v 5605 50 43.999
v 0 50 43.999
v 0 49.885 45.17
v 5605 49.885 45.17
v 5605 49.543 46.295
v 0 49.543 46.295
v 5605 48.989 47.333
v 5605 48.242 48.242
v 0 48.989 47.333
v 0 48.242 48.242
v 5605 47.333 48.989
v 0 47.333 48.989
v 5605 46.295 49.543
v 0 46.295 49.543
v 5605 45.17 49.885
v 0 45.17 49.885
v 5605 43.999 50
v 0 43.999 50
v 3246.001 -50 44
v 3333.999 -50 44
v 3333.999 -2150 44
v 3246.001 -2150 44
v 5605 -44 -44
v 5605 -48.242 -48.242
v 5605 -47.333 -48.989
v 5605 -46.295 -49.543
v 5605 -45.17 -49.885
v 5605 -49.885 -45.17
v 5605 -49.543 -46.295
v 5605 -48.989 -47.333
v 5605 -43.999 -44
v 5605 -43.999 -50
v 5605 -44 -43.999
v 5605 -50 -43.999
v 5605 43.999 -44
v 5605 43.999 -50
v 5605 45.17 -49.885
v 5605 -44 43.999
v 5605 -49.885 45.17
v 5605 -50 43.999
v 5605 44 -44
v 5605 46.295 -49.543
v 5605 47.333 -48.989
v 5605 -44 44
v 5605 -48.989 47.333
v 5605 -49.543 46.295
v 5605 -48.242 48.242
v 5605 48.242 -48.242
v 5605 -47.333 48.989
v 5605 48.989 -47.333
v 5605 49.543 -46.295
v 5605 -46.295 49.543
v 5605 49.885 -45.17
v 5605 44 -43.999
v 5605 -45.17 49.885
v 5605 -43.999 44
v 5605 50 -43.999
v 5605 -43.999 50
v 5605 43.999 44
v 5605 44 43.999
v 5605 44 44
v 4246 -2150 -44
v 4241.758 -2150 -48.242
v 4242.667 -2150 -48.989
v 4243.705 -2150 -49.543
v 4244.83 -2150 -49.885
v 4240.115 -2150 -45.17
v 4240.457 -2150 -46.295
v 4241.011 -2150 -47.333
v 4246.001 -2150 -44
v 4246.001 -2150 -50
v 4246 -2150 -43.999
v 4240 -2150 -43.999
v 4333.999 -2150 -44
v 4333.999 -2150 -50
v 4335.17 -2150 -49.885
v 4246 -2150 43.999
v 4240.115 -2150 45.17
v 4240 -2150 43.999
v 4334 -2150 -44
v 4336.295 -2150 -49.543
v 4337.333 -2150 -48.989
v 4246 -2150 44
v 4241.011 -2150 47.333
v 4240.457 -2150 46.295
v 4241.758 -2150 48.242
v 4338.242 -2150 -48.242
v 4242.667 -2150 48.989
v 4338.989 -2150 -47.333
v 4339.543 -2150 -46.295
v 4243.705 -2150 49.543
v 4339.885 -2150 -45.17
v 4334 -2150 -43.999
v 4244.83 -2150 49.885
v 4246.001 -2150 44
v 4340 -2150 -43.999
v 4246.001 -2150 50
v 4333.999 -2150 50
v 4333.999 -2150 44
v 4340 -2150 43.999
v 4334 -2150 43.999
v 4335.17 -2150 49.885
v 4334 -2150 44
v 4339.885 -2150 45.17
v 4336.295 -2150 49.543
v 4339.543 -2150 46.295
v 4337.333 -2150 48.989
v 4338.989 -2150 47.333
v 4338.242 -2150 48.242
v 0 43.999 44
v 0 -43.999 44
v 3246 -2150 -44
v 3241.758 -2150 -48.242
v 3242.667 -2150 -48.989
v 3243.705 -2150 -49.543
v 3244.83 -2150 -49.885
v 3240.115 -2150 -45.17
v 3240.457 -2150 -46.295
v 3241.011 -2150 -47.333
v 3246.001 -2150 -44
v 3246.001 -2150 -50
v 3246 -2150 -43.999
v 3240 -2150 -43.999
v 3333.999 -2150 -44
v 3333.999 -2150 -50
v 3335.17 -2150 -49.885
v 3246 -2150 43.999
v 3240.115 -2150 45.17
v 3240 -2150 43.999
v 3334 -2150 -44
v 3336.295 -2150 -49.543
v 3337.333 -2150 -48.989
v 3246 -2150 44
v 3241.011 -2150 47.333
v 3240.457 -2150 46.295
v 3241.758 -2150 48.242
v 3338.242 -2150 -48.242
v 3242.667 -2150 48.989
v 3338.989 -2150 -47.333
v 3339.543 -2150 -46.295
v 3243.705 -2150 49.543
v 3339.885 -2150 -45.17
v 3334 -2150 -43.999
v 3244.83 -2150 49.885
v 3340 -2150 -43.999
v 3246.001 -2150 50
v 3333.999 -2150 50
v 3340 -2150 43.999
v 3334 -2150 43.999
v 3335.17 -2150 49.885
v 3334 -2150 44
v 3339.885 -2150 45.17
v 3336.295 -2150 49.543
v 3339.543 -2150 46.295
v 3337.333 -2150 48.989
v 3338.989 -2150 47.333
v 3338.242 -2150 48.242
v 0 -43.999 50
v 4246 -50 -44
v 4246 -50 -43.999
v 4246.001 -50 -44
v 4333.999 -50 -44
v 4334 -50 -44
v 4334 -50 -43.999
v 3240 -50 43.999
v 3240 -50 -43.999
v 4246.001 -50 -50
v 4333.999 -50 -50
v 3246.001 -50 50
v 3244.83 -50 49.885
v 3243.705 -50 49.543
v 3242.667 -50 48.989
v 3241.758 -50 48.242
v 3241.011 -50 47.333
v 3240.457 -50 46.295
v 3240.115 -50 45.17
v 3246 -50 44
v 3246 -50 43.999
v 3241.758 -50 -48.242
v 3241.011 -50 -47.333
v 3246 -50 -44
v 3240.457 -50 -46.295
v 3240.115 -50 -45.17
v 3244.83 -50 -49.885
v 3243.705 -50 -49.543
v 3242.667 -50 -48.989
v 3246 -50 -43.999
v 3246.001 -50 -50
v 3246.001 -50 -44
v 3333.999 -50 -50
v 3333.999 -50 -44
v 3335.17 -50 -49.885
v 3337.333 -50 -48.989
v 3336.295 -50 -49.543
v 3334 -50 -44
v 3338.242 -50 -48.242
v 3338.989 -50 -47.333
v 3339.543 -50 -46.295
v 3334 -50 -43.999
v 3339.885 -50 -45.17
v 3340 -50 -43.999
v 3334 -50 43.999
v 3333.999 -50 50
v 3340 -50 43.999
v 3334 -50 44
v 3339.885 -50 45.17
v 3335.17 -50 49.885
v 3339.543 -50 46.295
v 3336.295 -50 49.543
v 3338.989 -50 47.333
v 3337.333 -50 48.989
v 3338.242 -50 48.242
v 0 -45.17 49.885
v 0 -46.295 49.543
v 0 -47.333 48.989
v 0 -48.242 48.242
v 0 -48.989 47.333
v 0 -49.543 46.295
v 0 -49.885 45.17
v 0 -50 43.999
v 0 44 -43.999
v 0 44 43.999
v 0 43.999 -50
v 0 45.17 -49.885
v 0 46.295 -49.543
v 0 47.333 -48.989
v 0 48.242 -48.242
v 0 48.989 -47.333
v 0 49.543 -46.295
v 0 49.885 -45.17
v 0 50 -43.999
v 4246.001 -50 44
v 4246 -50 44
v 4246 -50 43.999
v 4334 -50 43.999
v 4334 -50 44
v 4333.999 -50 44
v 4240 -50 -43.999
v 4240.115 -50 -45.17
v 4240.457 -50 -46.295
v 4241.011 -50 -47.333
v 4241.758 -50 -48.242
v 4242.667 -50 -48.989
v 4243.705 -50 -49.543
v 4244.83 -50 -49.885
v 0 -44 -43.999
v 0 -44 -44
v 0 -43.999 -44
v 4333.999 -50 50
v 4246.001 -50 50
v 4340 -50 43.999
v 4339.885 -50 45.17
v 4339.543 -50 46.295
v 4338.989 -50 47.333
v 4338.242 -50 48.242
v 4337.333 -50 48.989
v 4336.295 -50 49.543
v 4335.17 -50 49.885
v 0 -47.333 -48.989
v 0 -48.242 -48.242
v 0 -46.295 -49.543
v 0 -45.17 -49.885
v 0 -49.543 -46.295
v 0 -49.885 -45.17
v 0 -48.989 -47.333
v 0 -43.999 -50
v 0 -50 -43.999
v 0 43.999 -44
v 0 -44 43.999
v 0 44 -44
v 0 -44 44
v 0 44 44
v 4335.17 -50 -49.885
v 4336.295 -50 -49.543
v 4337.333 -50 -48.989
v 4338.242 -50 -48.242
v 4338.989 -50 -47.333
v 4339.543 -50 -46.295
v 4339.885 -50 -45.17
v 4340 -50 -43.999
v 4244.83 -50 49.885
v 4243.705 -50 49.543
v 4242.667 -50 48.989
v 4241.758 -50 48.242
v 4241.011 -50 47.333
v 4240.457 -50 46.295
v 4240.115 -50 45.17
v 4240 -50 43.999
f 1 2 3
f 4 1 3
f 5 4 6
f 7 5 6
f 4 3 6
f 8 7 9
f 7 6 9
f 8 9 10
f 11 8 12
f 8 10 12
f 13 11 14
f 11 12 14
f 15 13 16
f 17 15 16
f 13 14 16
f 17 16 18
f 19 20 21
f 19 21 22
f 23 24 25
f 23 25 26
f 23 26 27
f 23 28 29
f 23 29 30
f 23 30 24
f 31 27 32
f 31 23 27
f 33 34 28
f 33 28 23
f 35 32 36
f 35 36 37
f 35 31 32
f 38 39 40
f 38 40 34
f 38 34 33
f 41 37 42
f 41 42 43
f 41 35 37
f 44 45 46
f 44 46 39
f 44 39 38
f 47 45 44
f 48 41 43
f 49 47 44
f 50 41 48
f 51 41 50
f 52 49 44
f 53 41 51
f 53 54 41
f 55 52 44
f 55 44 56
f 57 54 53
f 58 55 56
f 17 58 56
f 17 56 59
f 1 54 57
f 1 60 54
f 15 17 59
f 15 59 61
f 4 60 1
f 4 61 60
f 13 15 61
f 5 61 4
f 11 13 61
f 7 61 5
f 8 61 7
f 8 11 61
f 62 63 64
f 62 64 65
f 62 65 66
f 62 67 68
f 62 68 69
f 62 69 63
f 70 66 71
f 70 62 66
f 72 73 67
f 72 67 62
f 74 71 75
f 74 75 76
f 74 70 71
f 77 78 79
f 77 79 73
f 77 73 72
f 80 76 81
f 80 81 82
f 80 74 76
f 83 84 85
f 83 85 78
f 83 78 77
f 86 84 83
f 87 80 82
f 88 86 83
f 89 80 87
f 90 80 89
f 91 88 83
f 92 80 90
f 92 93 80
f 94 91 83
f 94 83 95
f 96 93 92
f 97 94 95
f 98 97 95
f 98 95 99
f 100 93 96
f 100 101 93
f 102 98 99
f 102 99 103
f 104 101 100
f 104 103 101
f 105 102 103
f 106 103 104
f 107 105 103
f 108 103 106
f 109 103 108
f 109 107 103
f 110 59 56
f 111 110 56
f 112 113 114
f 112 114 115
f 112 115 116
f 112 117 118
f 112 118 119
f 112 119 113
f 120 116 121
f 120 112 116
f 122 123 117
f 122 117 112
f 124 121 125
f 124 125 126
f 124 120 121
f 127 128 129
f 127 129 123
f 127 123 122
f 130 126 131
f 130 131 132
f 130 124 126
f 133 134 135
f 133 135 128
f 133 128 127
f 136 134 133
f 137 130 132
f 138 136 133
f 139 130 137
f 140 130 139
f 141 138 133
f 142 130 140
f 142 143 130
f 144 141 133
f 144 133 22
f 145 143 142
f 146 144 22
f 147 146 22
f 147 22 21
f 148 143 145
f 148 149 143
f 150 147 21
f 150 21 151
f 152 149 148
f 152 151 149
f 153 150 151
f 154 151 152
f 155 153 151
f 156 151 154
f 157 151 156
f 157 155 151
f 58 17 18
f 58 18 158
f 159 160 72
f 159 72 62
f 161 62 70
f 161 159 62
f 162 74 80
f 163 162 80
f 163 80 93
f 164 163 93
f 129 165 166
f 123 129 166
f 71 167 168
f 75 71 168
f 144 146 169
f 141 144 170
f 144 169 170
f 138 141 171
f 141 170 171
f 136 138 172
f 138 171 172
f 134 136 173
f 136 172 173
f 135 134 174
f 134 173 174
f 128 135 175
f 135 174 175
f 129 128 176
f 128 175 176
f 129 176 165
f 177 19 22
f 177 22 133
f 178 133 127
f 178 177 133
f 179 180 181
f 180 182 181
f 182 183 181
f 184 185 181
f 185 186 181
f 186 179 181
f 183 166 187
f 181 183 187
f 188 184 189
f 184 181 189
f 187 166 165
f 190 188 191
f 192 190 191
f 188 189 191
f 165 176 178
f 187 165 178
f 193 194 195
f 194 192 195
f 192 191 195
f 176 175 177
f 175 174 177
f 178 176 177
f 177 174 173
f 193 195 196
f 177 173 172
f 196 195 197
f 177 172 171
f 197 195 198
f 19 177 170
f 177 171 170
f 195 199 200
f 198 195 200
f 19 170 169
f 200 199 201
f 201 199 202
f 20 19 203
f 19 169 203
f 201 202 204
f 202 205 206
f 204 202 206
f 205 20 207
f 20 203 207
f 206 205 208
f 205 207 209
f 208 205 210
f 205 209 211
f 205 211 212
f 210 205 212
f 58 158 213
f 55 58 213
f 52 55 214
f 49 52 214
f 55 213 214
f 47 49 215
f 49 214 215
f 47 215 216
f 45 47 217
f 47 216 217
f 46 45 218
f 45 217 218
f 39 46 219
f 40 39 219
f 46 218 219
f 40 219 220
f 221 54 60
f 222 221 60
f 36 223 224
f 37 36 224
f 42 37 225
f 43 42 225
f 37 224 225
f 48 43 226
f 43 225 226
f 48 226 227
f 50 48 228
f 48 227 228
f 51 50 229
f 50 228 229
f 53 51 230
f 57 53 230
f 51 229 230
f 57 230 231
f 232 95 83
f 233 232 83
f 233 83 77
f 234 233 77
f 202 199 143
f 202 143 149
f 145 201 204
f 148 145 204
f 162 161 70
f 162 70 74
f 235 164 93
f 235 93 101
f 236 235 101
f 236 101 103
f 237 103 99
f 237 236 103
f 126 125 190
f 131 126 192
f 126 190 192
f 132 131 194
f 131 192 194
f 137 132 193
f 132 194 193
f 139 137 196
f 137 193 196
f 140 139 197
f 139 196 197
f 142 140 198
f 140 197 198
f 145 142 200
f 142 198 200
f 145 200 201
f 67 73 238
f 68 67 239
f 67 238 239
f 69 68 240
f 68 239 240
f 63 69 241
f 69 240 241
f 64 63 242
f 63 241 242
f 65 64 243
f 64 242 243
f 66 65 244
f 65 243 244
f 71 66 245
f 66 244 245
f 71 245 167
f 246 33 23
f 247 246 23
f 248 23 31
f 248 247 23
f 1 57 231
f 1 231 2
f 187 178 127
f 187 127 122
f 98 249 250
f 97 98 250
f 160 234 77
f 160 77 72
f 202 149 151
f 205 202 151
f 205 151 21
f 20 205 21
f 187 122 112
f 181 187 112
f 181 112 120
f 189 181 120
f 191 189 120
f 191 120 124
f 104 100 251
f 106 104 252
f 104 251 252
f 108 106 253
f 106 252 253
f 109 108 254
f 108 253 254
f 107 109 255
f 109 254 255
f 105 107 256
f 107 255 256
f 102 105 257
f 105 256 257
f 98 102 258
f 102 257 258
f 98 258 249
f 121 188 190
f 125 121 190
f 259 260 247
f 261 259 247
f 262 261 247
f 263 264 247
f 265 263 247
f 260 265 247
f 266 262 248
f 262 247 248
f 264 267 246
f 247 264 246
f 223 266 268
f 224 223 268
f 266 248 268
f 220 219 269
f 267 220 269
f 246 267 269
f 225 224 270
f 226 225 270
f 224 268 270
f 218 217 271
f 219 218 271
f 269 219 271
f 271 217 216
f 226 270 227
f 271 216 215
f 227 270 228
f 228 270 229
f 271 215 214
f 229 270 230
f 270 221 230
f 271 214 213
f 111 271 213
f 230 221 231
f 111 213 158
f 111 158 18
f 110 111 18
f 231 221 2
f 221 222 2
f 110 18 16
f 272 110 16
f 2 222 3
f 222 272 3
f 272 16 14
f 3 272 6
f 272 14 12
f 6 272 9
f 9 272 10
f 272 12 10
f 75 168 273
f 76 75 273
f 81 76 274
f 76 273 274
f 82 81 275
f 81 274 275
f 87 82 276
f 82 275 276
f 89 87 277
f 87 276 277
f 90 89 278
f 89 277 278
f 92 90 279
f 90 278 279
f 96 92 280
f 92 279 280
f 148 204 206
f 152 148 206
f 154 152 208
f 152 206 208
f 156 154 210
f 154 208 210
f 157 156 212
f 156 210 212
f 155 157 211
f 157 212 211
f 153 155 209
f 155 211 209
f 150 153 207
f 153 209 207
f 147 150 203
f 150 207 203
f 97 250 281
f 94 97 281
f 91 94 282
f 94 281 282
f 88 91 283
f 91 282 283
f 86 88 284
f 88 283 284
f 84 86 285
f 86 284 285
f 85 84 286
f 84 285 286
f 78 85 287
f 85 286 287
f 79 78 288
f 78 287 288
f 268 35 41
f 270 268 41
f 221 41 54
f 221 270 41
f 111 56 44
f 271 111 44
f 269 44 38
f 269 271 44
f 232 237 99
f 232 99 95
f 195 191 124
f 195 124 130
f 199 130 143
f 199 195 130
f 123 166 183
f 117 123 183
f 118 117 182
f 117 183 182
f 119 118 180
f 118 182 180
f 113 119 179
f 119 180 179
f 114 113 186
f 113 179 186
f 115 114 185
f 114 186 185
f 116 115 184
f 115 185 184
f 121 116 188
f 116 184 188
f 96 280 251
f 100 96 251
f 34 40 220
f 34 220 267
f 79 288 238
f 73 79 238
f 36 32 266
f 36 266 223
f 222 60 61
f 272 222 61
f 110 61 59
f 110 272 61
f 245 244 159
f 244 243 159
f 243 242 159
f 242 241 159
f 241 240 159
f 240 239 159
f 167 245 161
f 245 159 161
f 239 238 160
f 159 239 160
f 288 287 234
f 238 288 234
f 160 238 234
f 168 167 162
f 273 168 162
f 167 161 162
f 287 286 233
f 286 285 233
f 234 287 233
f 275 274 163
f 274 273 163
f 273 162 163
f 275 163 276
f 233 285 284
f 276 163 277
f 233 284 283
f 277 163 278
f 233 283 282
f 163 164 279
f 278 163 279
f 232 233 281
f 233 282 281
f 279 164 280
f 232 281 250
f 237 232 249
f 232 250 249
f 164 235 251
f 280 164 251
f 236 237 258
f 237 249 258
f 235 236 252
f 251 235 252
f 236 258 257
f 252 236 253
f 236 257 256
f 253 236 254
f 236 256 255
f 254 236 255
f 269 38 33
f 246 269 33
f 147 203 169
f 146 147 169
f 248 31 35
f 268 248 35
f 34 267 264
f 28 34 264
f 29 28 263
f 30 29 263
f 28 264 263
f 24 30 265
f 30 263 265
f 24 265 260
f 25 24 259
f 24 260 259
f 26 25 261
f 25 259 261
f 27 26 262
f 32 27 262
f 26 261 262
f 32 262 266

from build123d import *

# Parameters (mm, degrees)
F_8639_82_100_X_100_X_6_0_1_DEPTH   = 5605
F_8639_82_100_X_100_X_6_0_1_2_DEPTH = 2151
F_8639_82_100_X_100_X_6_0_1_3_DEPTH = 2151


with BuildPart() as part:
    # Sketch1 → Квадратная труба гост 8639-82 100 X 100 X 6.0(1) (new body)
    with BuildSketch(Plane.YZ):
        with BuildLine():
            Line((-43.999, -50), (43.999, -50))
            ThreePointArc((43.999, -50), (48.242347794, -48.242347794), (50, -43.999))
            Line((50, -43.999), (50, 43.999))
            ThreePointArc((50, 43.999), (48.242347794, 48.242347794), (43.999, 50))
            Line((43.999, 50), (-43.999, 50))
            ThreePointArc((-43.999, 50), (-48.242347794, 48.242347794), (-50, 43.999))
            Line((-50, 43.999), (-50, -43.999))
            ThreePointArc((-50, -43.999), (-48.242347794, -48.242347794), (-43.999, -50))
        make_face()
        with BuildLine():
            Line((-43.999, -44), (43.999, -44))
            ThreePointArc((43.999, -44), (43.999707107, -43.999707107), (44, -43.999))
            Line((44, -43.999), (44, 43.999))
            ThreePointArc((44, 43.999), (43.999707107, 43.999707107), (43.999, 44))
            Line((43.999, 44), (-43.999, 44))
            ThreePointArc((-43.999, 44), (-43.999707107, 43.999707107), (-44, 43.999))
            Line((-44, 43.999), (-44, -43.999))
            ThreePointArc((-44, -43.999), (-43.999707107, -43.999707107), (-43.999, -44))
        make_face(mode=Mode.SUBTRACT)
    extrude(amount=F_8639_82_100_X_100_X_6_0_1_DEPTH)


with BuildPart() as body_2:
    # Sketch1 on segment 2 (carried to segment 2) → 8639-82 100 X 100 X 6.0_1 2 (new body)
    with BuildSketch(Plane(origin=(3290, 1, 0), x_dir=(1, 0, 0), z_dir=(0, -1, 0))):
        with BuildLine():
            Line((-43.999, -50), (43.999, -50))
            ThreePointArc((43.999, -50), (48.242347794, -48.242347794), (50, -43.999))
            Line((50, -43.999), (50, 43.999))
            ThreePointArc((50, 43.999), (48.242347794, 48.242347794), (43.999, 50))
            Line((43.999, 50), (-43.999, 50))
            ThreePointArc((-43.999, 50), (-48.242347794, 48.242347794), (-50, 43.999))
            Line((-50, 43.999), (-50, -43.999))
            ThreePointArc((-50, -43.999), (-48.242347794, -48.242347794), (-43.999, -50))
        make_face()
        with BuildLine():
            Line((-43.999, -44), (43.999, -44))
            ThreePointArc((43.999, -44), (43.999707107, -43.999707107), (44, -43.999))
            Line((44, -43.999), (44, 43.999))
            ThreePointArc((44, 43.999), (43.999707107, 43.999707107), (43.999, 44))
            Line((43.999, 44), (-43.999, 44))
            ThreePointArc((-43.999, 44), (-43.999707107, 43.999707107), (-44, 43.999))
            Line((-44, 43.999), (-44, -43.999))
            ThreePointArc((-44, -43.999), (-43.999707107, -43.999707107), (-43.999, -44))
        make_face(mode=Mode.SUBTRACT)
    extrude(amount=F_8639_82_100_X_100_X_6_0_1_2_DEPTH)

    # 8639-82 100 X 100 X 6.0_1 2 end butt 1
    split(bisect_by=Plane(origin=(3290, -50, 0), x_dir=(1, 0, 0), z_dir=(0, -1, 0)), keep=Keep.TOP)


with BuildPart() as body_3:
    # Sketch1 on segment 3 (carried to segment 3) → 8639-82 100 X 100 X 6.0_1 3 (new body)
    with BuildSketch(Plane(origin=(4290, 1, 0), x_dir=(1, 0, 0), z_dir=(0, -1, 0))):
        with BuildLine():
            Line((-43.999, -50), (43.999, -50))
            ThreePointArc((43.999, -50), (48.242347794, -48.242347794), (50, -43.999))
            Line((50, -43.999), (50, 43.999))
            ThreePointArc((50, 43.999), (48.242347794, 48.242347794), (43.999, 50))
            Line((43.999, 50), (-43.999, 50))
            ThreePointArc((-43.999, 50), (-48.242347794, 48.242347794), (-50, 43.999))
            Line((-50, 43.999), (-50, -43.999))
            ThreePointArc((-50, -43.999), (-48.242347794, -48.242347794), (-43.999, -50))
        make_face()
        with BuildLine():
            Line((-43.999, -44), (43.999, -44))
            ThreePointArc((43.999, -44), (43.999707107, -43.999707107), (44, -43.999))
            Line((44, -43.999), (44, 43.999))
            ThreePointArc((44, 43.999), (43.999707107, 43.999707107), (43.999, 44))
            Line((43.999, 44), (-43.999, 44))
            ThreePointArc((-43.999, 44), (-43.999707107, 43.999707107), (-44, 43.999))
            Line((-44, 43.999), (-44, -43.999))
            ThreePointArc((-44, -43.999), (-43.999707107, -43.999707107), (-43.999, -44))
        make_face(mode=Mode.SUBTRACT)
    extrude(amount=F_8639_82_100_X_100_X_6_0_1_3_DEPTH)

    # 8639-82 100 X 100 X 6.0_1 3 end butt 1
    split(bisect_by=Plane(origin=(4290, -50, 0), x_dir=(1, 0, 0), z_dir=(0, -1, 0)), keep=Keep.TOP)


solid = Compound([part.part, body_2.part, body_3.part])
